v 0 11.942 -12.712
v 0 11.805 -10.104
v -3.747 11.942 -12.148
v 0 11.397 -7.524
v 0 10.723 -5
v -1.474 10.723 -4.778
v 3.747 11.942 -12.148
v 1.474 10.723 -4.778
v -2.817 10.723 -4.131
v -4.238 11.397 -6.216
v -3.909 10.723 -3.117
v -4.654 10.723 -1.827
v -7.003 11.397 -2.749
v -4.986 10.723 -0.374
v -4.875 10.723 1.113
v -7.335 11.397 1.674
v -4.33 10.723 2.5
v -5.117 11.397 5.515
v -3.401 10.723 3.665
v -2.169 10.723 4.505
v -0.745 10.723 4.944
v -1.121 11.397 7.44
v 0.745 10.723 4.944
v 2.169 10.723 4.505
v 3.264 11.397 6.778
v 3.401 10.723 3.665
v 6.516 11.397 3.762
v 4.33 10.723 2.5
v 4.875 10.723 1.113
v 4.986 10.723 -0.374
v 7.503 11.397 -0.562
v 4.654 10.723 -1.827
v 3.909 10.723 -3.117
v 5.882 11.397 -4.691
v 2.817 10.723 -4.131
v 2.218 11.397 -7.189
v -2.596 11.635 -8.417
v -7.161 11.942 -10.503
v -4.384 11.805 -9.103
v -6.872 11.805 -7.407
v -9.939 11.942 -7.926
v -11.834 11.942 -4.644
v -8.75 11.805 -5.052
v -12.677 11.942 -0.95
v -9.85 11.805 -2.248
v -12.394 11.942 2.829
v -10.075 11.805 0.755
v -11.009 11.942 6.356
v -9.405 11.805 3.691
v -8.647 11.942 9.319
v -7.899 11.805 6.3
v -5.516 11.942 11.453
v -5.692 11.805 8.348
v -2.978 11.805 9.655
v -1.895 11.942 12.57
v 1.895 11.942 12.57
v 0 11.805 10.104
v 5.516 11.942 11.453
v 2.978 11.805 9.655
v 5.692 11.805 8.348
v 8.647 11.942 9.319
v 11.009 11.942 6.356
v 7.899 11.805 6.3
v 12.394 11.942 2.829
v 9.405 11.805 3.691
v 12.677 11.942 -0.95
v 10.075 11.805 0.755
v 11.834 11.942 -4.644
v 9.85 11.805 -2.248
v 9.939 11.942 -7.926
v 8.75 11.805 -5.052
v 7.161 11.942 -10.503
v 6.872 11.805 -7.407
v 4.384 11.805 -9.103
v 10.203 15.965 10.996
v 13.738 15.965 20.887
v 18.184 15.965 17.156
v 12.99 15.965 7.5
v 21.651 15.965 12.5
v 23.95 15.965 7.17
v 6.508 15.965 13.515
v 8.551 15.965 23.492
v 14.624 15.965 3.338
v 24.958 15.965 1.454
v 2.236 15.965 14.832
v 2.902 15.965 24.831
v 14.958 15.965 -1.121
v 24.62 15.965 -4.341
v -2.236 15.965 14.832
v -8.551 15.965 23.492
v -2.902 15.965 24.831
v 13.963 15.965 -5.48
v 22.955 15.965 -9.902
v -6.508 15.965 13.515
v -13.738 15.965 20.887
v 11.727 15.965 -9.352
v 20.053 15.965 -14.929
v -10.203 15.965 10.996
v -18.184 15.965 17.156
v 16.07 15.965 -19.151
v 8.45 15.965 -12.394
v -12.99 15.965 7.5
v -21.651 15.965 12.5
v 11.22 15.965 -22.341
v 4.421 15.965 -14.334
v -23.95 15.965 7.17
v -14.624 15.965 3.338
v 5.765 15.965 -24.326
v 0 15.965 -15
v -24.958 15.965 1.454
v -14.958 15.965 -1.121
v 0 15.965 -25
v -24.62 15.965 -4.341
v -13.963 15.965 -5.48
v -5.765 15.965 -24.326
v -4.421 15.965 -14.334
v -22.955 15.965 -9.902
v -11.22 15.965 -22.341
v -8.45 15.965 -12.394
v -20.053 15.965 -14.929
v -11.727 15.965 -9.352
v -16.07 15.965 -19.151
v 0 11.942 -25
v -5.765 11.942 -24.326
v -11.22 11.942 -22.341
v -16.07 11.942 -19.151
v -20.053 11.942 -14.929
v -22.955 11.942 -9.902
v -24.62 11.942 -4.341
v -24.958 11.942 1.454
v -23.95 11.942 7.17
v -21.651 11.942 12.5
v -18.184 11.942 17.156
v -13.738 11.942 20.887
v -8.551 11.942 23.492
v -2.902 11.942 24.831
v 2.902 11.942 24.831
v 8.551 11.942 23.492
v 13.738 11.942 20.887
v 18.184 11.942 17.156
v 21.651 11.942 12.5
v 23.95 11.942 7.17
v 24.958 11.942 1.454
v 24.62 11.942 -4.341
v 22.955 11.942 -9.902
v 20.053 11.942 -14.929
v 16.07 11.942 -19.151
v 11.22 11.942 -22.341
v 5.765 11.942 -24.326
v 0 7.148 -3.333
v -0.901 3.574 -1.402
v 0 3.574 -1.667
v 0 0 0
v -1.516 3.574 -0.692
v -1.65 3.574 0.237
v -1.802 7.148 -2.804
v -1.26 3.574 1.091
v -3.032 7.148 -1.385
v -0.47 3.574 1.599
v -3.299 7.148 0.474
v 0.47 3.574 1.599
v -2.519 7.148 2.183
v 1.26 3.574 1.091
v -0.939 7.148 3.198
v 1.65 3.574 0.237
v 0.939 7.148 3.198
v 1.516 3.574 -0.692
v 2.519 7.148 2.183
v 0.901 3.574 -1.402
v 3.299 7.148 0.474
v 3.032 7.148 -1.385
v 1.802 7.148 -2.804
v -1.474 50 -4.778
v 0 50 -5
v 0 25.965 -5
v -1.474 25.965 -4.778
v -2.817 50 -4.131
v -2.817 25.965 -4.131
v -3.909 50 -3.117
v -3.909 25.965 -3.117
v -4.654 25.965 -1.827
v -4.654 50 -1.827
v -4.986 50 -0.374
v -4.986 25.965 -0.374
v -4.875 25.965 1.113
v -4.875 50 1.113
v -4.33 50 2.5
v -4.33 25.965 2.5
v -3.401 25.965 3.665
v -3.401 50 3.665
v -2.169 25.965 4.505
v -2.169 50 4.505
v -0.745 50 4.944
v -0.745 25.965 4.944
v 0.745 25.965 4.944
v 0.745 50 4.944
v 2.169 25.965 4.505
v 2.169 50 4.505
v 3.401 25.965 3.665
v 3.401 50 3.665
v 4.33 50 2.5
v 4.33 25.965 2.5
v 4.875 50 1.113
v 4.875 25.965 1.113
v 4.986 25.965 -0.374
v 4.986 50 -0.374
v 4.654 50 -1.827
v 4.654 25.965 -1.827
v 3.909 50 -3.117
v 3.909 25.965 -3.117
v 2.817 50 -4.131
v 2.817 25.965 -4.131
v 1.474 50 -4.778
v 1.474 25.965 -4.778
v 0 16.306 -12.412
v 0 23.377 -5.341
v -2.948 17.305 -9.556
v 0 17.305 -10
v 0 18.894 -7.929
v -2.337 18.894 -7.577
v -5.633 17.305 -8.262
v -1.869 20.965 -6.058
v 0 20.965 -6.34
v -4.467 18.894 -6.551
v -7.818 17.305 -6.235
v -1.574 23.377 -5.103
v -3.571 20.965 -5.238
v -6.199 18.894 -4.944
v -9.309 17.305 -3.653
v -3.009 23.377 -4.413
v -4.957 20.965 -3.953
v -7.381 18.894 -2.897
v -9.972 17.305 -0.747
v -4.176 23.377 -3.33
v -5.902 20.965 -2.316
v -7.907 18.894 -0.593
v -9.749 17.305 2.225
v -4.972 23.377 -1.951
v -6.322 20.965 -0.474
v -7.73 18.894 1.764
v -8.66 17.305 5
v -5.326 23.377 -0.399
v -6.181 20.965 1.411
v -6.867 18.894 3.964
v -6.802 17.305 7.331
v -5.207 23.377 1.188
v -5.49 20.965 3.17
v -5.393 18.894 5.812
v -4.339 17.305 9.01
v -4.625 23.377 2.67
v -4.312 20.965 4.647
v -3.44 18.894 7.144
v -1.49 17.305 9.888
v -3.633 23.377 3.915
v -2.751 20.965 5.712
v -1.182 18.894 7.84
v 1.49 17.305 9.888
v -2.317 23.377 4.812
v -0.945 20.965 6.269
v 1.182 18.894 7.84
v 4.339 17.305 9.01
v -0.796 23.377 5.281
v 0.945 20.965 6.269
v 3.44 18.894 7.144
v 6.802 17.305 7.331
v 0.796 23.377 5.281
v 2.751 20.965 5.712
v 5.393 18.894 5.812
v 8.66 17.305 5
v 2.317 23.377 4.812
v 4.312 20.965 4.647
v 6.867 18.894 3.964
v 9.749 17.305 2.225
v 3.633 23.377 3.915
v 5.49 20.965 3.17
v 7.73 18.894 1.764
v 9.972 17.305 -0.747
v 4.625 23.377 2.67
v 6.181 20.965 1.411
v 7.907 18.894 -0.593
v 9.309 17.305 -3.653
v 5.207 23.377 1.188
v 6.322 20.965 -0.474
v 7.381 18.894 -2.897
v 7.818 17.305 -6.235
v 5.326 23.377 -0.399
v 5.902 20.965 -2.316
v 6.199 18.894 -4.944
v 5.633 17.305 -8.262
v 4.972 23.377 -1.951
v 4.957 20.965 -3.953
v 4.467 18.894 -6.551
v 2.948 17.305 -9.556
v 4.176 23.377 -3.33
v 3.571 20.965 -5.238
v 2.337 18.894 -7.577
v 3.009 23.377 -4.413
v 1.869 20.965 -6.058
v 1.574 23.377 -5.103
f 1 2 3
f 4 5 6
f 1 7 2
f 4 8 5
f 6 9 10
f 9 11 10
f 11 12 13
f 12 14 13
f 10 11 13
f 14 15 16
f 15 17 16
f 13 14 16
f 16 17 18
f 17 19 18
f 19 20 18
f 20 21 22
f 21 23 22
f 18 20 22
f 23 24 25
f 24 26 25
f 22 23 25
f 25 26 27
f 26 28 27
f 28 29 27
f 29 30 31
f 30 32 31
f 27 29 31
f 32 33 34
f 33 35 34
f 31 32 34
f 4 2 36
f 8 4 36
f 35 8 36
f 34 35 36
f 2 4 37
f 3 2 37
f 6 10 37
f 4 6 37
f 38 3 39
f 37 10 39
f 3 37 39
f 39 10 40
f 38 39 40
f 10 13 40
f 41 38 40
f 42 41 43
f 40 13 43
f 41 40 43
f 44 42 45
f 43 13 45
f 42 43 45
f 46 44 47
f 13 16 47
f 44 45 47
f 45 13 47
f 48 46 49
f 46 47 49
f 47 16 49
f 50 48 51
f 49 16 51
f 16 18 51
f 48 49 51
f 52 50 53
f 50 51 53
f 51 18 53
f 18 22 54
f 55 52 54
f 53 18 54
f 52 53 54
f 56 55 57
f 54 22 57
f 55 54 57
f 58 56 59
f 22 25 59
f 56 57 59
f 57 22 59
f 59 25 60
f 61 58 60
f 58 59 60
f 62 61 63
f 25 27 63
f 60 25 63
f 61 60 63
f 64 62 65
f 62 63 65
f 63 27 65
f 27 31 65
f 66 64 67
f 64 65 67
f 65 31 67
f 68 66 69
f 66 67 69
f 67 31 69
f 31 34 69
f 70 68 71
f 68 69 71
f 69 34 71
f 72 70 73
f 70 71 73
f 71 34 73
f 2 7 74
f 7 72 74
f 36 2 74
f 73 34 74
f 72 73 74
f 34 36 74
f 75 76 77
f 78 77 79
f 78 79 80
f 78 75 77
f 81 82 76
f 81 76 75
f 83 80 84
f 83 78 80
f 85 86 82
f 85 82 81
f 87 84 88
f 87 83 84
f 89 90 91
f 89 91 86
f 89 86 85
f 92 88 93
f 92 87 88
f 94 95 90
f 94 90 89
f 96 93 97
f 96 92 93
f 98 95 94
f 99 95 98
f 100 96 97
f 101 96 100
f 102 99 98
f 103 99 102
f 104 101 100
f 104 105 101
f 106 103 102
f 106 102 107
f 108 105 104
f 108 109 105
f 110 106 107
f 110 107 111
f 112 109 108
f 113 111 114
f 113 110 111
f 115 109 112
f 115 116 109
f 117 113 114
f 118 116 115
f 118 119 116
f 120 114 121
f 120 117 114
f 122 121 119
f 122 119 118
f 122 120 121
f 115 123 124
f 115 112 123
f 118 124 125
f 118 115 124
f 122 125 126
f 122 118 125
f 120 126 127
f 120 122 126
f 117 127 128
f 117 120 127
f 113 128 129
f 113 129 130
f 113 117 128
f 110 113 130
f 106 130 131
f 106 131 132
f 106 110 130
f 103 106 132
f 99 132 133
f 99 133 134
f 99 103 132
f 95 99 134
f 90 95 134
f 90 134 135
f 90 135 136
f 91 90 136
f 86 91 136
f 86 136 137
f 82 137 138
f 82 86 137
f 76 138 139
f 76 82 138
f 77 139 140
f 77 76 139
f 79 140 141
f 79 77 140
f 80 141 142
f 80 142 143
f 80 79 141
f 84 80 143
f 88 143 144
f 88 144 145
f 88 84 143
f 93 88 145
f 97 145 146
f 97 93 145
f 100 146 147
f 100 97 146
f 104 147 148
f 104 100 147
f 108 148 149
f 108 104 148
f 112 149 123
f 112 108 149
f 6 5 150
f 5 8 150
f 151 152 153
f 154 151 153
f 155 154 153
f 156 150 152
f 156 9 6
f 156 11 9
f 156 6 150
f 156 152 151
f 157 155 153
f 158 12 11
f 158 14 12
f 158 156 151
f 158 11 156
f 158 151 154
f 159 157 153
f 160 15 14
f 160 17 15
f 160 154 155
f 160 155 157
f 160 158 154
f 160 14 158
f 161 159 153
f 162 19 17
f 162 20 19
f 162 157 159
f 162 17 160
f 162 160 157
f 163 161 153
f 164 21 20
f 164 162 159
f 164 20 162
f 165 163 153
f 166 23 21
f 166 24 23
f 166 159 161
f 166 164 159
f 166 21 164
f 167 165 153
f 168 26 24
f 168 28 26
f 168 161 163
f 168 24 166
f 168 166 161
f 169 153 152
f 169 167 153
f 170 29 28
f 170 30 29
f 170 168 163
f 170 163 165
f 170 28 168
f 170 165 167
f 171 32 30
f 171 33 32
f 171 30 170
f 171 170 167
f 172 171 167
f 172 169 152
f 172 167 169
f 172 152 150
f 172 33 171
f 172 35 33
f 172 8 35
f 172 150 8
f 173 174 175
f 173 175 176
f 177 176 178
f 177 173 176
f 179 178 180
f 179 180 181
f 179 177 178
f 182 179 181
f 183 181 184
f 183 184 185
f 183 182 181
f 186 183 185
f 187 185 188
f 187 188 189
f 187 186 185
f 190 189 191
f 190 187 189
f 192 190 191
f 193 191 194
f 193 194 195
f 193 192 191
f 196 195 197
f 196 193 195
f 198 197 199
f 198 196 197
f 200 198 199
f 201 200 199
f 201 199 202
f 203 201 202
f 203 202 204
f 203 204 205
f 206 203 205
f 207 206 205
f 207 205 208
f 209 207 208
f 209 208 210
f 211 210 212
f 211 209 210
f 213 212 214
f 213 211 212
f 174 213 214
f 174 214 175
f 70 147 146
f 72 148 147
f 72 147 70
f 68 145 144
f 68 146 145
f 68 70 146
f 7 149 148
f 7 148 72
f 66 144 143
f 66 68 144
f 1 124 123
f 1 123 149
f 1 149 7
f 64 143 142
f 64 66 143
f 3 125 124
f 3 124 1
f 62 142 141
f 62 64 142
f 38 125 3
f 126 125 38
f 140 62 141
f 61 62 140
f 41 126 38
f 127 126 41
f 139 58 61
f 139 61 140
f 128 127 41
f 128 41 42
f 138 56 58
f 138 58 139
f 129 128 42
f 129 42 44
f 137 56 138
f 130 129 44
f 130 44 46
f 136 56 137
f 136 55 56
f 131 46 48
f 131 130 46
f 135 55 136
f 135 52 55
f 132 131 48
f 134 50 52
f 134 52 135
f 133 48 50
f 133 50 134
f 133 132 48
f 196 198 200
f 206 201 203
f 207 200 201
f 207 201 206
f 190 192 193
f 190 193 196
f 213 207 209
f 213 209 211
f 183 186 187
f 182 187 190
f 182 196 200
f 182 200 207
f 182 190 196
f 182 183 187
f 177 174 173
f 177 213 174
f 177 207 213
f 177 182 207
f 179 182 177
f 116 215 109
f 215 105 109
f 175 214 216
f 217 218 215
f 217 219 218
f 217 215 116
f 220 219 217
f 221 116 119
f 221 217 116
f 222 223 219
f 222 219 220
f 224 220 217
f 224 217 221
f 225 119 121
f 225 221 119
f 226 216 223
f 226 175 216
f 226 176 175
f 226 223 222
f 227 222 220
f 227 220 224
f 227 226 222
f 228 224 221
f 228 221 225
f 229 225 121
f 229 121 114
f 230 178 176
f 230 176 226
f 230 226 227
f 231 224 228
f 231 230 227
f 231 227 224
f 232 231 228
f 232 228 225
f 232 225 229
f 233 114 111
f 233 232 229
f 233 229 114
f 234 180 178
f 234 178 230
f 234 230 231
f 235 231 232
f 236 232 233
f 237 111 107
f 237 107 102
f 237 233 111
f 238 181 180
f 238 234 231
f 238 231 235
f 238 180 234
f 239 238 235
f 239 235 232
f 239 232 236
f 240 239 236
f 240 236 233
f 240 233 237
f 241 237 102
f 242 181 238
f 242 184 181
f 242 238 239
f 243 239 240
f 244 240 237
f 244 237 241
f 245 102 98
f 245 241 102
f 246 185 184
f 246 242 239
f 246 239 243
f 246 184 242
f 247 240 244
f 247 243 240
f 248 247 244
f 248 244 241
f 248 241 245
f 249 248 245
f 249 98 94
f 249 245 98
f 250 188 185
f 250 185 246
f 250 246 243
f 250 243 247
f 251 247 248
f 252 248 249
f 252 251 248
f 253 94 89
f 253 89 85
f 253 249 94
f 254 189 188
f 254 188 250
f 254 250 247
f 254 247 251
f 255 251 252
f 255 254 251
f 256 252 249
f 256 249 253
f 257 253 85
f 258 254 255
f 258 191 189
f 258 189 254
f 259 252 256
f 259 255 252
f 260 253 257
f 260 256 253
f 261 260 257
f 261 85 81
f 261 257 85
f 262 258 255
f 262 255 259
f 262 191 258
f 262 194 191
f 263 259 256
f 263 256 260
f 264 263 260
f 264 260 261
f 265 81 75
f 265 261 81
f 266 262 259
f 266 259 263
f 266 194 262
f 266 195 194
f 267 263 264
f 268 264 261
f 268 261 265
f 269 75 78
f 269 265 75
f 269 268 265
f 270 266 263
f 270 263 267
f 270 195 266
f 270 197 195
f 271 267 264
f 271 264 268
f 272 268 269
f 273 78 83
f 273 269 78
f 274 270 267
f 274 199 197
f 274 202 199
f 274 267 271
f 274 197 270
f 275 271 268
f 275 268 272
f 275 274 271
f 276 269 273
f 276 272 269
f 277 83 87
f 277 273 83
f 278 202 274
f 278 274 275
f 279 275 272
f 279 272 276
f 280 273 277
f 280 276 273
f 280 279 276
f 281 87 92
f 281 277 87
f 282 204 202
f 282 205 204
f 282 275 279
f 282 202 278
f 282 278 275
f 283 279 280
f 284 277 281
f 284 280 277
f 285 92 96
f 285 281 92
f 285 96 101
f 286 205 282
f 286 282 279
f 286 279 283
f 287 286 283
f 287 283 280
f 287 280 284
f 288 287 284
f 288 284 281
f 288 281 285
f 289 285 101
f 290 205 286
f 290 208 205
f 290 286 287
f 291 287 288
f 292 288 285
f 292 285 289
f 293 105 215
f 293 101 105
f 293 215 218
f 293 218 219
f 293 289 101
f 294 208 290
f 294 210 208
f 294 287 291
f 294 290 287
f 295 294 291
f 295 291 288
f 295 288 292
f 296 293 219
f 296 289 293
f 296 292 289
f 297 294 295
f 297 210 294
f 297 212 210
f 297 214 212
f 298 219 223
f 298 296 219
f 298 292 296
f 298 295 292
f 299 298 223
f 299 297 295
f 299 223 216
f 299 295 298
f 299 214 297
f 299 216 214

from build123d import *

# Parameters (mm, degrees)
FILLET1_R  = 25
FILLET12_R = 10


with BuildPart() as part:
    # Sketch1 → Revolve1 (revolve)
    with BuildSketch(Plane(origin=(0, 0, 0), x_dir=(0, 0, -1), z_dir=(1, 0, 0))):
        Polygon((0, 0), (5, 10.722534603), (5, 11.94189357), (25, 11.94189357), (25, 15.964993567), (5, 15.964993567), (5, 50), (0, 50), align=None)
    revolve(axis=Axis((0, 0, 0), (0, 1, 0)))

    # Fillet1
    # the kernel refuses this fillet: 25 mm, written as the material it adds along each edge
    with BuildSketch(Plane(origin=(0, 11.94189357, 0), x_dir=(0, 0, -1), z_dir=(1, 0, 0))) as fillet1_piece_1:
        with BuildLine():
            CenterArc((12.712399892, -25), FILLET1_R, 90, 17.968615565)
            Line((12.712399892, 0), (12.712399892, 0.5))
            Line((12.712399892, 0.5), (5, 0.5))
            Line((5, 0.5), (4.5, 0))
            ThreePointArc((4.5, 0), (4.5, -0.609679484), (4.845752002, -0.743746147))
            Line((4.845752002, -0.743746147), (5, -1.219358968))
        make_face()
    revolve(axis=Axis((0, 11.94189357, 0), (0, 1, 0)))

    # Fillet12
    fillet12_edges = [part.edges().sort_by_distance(p)[0] for p in [
        (0, 15.964993567, 5),
    ]]
    fillet(fillet12_edges, radius=FILLET12_R)


solid = part.part
